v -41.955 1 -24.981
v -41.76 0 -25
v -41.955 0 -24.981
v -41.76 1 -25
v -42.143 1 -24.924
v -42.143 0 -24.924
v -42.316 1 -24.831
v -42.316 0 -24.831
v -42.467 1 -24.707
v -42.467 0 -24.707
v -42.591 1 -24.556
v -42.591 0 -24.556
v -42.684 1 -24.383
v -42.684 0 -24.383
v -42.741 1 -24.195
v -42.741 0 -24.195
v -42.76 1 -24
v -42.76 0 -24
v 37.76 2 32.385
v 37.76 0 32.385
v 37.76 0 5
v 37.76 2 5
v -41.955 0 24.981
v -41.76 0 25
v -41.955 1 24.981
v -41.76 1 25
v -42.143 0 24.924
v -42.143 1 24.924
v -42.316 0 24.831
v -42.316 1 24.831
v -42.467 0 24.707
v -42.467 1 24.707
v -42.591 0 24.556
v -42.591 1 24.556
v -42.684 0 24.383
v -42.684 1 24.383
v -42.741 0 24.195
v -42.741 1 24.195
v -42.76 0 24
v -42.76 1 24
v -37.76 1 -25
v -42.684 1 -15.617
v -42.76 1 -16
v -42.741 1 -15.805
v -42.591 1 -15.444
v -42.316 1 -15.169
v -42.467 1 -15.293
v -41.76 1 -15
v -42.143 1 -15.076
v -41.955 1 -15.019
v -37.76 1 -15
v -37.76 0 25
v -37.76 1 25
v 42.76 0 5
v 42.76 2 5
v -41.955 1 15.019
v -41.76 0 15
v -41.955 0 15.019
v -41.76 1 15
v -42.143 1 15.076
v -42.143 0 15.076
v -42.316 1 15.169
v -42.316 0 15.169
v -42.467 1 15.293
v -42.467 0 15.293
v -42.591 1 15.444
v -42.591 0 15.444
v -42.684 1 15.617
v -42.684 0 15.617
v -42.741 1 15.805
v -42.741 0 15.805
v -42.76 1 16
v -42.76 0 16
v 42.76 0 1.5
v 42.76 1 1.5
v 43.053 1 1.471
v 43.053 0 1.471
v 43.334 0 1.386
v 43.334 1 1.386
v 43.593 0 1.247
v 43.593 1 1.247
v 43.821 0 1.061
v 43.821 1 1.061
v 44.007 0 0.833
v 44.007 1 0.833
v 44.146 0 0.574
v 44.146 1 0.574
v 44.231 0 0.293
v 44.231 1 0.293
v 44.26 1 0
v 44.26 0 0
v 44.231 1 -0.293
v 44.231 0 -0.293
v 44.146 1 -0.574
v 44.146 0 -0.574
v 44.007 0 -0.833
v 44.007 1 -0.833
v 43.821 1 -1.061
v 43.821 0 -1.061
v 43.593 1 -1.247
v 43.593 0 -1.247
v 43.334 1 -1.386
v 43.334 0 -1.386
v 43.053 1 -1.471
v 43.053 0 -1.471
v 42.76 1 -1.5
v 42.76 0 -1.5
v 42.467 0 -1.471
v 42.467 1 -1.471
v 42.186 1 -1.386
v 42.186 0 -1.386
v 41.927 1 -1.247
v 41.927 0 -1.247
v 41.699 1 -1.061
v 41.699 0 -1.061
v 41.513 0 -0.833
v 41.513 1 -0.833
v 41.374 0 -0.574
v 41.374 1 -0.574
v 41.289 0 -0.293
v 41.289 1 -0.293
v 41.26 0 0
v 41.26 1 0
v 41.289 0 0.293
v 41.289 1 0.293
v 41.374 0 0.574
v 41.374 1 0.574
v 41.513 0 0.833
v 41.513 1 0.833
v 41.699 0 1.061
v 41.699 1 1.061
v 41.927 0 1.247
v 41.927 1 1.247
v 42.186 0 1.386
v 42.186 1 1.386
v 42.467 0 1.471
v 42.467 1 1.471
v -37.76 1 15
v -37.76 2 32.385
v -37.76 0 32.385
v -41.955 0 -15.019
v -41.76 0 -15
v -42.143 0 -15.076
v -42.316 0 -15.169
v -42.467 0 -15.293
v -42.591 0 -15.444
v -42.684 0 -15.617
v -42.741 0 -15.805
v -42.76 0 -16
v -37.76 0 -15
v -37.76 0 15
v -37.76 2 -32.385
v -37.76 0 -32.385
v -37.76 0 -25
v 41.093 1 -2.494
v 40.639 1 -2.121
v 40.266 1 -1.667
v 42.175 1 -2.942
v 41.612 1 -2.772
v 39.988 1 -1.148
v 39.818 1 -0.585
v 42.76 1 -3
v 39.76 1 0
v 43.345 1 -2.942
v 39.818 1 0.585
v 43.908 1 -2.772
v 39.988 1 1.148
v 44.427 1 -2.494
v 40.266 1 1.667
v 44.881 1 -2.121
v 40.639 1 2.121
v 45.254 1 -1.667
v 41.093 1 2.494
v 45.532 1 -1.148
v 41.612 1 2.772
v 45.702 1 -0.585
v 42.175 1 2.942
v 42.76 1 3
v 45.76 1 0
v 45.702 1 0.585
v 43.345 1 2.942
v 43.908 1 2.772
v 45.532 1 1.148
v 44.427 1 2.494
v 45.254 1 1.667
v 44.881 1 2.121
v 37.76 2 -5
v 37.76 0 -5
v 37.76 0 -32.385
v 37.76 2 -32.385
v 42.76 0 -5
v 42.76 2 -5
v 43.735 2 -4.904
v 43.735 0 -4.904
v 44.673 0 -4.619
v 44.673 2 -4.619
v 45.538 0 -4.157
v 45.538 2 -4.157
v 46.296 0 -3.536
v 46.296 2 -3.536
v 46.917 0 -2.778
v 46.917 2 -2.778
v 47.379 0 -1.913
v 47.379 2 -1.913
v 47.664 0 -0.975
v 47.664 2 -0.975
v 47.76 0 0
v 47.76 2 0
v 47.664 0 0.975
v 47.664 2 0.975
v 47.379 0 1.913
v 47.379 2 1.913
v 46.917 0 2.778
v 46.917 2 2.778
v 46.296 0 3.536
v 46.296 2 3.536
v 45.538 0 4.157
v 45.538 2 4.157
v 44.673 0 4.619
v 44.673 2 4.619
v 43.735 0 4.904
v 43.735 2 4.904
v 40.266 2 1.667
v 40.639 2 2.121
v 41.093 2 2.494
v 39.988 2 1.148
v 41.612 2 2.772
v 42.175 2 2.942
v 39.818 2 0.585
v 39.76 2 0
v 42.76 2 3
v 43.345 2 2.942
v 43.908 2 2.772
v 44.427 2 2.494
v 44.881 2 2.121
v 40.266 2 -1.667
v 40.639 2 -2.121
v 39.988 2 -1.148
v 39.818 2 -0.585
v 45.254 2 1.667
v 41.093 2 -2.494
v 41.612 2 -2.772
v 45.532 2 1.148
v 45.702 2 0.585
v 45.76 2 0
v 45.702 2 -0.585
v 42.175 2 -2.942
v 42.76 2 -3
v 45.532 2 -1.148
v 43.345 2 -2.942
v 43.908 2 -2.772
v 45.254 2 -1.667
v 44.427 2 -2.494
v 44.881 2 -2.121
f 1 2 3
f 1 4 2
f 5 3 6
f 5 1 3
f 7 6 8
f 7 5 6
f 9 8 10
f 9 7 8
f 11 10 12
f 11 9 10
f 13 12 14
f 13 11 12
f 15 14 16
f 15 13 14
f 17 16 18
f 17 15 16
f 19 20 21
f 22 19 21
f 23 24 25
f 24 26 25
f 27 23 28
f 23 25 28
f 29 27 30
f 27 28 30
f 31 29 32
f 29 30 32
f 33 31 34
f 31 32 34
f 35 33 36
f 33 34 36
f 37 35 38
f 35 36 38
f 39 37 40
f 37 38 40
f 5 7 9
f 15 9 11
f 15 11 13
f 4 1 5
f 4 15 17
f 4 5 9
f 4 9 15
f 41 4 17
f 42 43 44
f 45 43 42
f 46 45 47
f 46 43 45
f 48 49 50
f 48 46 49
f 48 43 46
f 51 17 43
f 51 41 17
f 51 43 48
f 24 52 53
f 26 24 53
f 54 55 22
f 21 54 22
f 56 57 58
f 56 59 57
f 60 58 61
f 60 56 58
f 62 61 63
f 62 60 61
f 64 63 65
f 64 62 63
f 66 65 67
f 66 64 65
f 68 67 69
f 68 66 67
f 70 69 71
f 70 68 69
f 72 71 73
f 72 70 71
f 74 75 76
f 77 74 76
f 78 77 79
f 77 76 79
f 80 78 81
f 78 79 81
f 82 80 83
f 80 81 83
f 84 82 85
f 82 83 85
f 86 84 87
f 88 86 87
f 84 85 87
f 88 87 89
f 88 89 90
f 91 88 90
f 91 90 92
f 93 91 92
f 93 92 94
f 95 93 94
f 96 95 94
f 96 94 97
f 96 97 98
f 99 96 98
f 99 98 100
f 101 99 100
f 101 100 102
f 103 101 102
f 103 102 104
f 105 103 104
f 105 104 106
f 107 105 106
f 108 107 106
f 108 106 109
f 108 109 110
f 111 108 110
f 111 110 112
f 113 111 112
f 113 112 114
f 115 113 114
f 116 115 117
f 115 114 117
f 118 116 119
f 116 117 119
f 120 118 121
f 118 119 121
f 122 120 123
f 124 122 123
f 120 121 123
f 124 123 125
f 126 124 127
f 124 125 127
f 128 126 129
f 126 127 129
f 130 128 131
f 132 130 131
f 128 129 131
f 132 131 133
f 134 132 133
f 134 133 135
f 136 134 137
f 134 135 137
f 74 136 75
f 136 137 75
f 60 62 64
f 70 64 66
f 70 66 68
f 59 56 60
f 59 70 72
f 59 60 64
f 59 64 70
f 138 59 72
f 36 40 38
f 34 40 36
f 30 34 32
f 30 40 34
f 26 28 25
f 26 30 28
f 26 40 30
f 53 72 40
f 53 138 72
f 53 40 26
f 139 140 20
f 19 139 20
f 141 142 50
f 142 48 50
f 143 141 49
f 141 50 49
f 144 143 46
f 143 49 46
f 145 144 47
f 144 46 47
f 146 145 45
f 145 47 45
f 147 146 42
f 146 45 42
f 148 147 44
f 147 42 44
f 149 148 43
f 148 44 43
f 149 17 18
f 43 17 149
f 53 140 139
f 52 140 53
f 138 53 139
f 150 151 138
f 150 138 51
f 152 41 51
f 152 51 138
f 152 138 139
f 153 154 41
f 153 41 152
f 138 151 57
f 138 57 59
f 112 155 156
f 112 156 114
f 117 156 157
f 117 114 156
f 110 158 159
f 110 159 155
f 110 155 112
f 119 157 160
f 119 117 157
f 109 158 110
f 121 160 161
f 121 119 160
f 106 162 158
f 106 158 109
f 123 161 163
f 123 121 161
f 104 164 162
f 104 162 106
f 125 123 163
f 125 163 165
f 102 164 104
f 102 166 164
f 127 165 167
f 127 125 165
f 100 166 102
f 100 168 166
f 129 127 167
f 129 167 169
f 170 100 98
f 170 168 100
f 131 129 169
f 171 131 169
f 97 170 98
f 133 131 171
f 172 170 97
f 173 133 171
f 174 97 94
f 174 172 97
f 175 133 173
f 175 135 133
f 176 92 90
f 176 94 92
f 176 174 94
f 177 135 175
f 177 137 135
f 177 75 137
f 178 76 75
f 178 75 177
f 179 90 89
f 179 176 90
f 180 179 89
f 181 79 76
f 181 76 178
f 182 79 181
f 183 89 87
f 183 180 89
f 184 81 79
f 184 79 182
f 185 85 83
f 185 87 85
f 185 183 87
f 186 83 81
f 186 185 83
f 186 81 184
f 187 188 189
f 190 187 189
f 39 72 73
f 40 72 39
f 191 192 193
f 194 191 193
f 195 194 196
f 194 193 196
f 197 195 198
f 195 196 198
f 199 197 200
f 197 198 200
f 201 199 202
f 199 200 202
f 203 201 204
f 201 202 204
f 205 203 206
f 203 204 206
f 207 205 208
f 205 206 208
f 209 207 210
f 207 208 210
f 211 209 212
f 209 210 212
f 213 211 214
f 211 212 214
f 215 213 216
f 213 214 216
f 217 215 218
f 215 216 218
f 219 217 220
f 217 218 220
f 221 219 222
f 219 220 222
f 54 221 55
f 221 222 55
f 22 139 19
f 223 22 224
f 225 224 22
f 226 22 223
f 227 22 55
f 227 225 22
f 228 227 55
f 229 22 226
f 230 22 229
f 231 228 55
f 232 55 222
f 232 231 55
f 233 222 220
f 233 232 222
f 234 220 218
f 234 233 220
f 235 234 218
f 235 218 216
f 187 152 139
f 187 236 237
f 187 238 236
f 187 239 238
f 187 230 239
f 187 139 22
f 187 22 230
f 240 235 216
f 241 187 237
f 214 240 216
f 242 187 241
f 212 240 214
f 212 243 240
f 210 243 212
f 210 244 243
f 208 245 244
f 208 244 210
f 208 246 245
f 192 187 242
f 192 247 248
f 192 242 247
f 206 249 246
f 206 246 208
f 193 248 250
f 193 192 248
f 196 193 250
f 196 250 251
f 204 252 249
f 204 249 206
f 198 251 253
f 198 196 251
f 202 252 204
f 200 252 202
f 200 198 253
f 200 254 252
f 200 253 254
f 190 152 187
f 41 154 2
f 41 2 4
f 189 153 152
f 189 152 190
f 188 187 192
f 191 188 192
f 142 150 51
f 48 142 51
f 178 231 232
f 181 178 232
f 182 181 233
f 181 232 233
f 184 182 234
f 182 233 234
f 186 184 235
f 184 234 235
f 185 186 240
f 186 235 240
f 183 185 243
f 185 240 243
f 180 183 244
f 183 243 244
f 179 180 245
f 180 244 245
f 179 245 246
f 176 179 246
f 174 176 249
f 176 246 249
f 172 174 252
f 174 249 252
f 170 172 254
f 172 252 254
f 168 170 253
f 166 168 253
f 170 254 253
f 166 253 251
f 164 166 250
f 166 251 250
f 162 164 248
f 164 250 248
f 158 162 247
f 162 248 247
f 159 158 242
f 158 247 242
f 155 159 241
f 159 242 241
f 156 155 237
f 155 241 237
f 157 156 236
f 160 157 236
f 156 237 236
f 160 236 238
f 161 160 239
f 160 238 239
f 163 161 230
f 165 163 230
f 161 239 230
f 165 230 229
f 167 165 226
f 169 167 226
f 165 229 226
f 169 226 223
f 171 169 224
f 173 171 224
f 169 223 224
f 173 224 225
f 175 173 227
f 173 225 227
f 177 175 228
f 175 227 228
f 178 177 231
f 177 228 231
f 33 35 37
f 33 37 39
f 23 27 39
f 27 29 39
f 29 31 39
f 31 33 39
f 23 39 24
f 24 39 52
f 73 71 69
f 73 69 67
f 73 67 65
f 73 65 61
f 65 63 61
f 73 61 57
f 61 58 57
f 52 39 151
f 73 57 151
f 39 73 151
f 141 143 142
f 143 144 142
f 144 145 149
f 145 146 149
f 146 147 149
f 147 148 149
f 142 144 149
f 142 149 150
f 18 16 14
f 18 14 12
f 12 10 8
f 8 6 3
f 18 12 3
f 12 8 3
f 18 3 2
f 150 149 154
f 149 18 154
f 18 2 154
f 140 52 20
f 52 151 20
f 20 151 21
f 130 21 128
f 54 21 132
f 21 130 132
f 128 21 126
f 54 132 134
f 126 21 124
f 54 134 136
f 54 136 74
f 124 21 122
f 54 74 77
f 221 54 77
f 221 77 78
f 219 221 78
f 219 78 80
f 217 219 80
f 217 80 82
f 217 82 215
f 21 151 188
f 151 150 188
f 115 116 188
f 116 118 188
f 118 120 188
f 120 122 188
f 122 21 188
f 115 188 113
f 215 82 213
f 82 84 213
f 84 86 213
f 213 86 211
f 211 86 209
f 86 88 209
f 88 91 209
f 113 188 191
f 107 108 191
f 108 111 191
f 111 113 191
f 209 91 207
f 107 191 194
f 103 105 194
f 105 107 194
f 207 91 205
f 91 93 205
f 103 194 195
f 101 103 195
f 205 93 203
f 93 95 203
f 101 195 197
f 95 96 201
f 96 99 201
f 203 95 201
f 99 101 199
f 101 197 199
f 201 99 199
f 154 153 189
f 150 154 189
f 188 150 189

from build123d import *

# Parameters (mm, degrees)
SKETCH1_W           = 75.52
SKETCH1_H           = 64.77
BOSS_EXTRUDE1_DEPTH = 2
BOSS_EXTRUDE2_DEPTH = 2
SKETCH3_W           = 10
SKETCH3_H           = 1
BOSS_EXTRUDE3_DEPTH = 5
SKETCH7_R           = 1.5
CUT_EXTRUDE2_DEPTH  = 2
SKETCH9_R           = 3
SKETCH9_R_2         = 1.5
CUT_EXTRUDE4_DEPTH  = 1
FILLET1_R           = 1


with BuildPart() as part:
    # Sketch1 → Boss-Extrude1 (new body)
    with BuildSketch(Plane(origin=(0, 0, 0), x_dir=(1, 0, 0), z_dir=(0, 1, 0))):
        Rectangle(SKETCH1_W, SKETCH1_H)
    extrude(amount=BOSS_EXTRUDE1_DEPTH)

    # Sketch2 → Boss-Extrude2 (add)
    with BuildSketch(Plane(origin=(0, 2, 0), x_dir=(1, 0, 0), z_dir=(0, 1, 0))):
        with BuildLine():
            Line((37.76, 5), (42.76, 5))
            ThreePointArc((42.76, 5), (47.76, 0), (42.76, -5))
            Line((42.76, -5), (37.76, -5))
            Line((37.76, -5), (37.76, 5))
        make_face()
    extrude(amount=-BOSS_EXTRUDE2_DEPTH)

    # Sketch3 → Boss-Extrude3 (add)
    with BuildSketch(Plane.ZY.offset(37.76)):
        with Locations((-20, 0.5)):
            Rectangle(SKETCH3_W, SKETCH3_H)
        with Locations((20, 0.5)):
            Rectangle(SKETCH3_W, SKETCH3_H)
    extrude(amount=BOSS_EXTRUDE3_DEPTH)

    # Sketch7 → Cut-Extrude2 (cut)
    with BuildSketch(Plane(origin=(0, 2, 0), x_dir=(1, 0, 0), z_dir=(0, 1, 0))):
        with Locations(Location((42.76, 0, 0), (0, 0, 270))):
            Circle(SKETCH7_R)
    extrude(amount=-CUT_EXTRUDE2_DEPTH, mode=Mode.SUBTRACT)

    # Sketch9 → Cut-Extrude4 (cut)
    with BuildSketch(Plane(origin=(0, 2, 0), x_dir=(1, 0, 0), z_dir=(0, 1, 0))):
        with Locations(Location((42.76, 0, 0), (0, 0, 270))):
            Circle(SKETCH9_R)
        with Locations(Location((42.76, 0, 0), (0, 0, 270))):
            Circle(SKETCH9_R_2, mode=Mode.SUBTRACT)
    extrude(amount=-CUT_EXTRUDE4_DEPTH, mode=Mode.SUBTRACT)

    # Fillet1
    fillet1_edges = [part.edges().sort_by_distance(p)[0] for p in [
        (-42.76, 0.5, -15),
        (-42.76, 0.5, -25),
        (-42.76, 0.5, 25),
        (-42.76, 0.5, 15),
    ]]
    fillet(fillet1_edges, radius=FILLET1_R)


solid = part.part
